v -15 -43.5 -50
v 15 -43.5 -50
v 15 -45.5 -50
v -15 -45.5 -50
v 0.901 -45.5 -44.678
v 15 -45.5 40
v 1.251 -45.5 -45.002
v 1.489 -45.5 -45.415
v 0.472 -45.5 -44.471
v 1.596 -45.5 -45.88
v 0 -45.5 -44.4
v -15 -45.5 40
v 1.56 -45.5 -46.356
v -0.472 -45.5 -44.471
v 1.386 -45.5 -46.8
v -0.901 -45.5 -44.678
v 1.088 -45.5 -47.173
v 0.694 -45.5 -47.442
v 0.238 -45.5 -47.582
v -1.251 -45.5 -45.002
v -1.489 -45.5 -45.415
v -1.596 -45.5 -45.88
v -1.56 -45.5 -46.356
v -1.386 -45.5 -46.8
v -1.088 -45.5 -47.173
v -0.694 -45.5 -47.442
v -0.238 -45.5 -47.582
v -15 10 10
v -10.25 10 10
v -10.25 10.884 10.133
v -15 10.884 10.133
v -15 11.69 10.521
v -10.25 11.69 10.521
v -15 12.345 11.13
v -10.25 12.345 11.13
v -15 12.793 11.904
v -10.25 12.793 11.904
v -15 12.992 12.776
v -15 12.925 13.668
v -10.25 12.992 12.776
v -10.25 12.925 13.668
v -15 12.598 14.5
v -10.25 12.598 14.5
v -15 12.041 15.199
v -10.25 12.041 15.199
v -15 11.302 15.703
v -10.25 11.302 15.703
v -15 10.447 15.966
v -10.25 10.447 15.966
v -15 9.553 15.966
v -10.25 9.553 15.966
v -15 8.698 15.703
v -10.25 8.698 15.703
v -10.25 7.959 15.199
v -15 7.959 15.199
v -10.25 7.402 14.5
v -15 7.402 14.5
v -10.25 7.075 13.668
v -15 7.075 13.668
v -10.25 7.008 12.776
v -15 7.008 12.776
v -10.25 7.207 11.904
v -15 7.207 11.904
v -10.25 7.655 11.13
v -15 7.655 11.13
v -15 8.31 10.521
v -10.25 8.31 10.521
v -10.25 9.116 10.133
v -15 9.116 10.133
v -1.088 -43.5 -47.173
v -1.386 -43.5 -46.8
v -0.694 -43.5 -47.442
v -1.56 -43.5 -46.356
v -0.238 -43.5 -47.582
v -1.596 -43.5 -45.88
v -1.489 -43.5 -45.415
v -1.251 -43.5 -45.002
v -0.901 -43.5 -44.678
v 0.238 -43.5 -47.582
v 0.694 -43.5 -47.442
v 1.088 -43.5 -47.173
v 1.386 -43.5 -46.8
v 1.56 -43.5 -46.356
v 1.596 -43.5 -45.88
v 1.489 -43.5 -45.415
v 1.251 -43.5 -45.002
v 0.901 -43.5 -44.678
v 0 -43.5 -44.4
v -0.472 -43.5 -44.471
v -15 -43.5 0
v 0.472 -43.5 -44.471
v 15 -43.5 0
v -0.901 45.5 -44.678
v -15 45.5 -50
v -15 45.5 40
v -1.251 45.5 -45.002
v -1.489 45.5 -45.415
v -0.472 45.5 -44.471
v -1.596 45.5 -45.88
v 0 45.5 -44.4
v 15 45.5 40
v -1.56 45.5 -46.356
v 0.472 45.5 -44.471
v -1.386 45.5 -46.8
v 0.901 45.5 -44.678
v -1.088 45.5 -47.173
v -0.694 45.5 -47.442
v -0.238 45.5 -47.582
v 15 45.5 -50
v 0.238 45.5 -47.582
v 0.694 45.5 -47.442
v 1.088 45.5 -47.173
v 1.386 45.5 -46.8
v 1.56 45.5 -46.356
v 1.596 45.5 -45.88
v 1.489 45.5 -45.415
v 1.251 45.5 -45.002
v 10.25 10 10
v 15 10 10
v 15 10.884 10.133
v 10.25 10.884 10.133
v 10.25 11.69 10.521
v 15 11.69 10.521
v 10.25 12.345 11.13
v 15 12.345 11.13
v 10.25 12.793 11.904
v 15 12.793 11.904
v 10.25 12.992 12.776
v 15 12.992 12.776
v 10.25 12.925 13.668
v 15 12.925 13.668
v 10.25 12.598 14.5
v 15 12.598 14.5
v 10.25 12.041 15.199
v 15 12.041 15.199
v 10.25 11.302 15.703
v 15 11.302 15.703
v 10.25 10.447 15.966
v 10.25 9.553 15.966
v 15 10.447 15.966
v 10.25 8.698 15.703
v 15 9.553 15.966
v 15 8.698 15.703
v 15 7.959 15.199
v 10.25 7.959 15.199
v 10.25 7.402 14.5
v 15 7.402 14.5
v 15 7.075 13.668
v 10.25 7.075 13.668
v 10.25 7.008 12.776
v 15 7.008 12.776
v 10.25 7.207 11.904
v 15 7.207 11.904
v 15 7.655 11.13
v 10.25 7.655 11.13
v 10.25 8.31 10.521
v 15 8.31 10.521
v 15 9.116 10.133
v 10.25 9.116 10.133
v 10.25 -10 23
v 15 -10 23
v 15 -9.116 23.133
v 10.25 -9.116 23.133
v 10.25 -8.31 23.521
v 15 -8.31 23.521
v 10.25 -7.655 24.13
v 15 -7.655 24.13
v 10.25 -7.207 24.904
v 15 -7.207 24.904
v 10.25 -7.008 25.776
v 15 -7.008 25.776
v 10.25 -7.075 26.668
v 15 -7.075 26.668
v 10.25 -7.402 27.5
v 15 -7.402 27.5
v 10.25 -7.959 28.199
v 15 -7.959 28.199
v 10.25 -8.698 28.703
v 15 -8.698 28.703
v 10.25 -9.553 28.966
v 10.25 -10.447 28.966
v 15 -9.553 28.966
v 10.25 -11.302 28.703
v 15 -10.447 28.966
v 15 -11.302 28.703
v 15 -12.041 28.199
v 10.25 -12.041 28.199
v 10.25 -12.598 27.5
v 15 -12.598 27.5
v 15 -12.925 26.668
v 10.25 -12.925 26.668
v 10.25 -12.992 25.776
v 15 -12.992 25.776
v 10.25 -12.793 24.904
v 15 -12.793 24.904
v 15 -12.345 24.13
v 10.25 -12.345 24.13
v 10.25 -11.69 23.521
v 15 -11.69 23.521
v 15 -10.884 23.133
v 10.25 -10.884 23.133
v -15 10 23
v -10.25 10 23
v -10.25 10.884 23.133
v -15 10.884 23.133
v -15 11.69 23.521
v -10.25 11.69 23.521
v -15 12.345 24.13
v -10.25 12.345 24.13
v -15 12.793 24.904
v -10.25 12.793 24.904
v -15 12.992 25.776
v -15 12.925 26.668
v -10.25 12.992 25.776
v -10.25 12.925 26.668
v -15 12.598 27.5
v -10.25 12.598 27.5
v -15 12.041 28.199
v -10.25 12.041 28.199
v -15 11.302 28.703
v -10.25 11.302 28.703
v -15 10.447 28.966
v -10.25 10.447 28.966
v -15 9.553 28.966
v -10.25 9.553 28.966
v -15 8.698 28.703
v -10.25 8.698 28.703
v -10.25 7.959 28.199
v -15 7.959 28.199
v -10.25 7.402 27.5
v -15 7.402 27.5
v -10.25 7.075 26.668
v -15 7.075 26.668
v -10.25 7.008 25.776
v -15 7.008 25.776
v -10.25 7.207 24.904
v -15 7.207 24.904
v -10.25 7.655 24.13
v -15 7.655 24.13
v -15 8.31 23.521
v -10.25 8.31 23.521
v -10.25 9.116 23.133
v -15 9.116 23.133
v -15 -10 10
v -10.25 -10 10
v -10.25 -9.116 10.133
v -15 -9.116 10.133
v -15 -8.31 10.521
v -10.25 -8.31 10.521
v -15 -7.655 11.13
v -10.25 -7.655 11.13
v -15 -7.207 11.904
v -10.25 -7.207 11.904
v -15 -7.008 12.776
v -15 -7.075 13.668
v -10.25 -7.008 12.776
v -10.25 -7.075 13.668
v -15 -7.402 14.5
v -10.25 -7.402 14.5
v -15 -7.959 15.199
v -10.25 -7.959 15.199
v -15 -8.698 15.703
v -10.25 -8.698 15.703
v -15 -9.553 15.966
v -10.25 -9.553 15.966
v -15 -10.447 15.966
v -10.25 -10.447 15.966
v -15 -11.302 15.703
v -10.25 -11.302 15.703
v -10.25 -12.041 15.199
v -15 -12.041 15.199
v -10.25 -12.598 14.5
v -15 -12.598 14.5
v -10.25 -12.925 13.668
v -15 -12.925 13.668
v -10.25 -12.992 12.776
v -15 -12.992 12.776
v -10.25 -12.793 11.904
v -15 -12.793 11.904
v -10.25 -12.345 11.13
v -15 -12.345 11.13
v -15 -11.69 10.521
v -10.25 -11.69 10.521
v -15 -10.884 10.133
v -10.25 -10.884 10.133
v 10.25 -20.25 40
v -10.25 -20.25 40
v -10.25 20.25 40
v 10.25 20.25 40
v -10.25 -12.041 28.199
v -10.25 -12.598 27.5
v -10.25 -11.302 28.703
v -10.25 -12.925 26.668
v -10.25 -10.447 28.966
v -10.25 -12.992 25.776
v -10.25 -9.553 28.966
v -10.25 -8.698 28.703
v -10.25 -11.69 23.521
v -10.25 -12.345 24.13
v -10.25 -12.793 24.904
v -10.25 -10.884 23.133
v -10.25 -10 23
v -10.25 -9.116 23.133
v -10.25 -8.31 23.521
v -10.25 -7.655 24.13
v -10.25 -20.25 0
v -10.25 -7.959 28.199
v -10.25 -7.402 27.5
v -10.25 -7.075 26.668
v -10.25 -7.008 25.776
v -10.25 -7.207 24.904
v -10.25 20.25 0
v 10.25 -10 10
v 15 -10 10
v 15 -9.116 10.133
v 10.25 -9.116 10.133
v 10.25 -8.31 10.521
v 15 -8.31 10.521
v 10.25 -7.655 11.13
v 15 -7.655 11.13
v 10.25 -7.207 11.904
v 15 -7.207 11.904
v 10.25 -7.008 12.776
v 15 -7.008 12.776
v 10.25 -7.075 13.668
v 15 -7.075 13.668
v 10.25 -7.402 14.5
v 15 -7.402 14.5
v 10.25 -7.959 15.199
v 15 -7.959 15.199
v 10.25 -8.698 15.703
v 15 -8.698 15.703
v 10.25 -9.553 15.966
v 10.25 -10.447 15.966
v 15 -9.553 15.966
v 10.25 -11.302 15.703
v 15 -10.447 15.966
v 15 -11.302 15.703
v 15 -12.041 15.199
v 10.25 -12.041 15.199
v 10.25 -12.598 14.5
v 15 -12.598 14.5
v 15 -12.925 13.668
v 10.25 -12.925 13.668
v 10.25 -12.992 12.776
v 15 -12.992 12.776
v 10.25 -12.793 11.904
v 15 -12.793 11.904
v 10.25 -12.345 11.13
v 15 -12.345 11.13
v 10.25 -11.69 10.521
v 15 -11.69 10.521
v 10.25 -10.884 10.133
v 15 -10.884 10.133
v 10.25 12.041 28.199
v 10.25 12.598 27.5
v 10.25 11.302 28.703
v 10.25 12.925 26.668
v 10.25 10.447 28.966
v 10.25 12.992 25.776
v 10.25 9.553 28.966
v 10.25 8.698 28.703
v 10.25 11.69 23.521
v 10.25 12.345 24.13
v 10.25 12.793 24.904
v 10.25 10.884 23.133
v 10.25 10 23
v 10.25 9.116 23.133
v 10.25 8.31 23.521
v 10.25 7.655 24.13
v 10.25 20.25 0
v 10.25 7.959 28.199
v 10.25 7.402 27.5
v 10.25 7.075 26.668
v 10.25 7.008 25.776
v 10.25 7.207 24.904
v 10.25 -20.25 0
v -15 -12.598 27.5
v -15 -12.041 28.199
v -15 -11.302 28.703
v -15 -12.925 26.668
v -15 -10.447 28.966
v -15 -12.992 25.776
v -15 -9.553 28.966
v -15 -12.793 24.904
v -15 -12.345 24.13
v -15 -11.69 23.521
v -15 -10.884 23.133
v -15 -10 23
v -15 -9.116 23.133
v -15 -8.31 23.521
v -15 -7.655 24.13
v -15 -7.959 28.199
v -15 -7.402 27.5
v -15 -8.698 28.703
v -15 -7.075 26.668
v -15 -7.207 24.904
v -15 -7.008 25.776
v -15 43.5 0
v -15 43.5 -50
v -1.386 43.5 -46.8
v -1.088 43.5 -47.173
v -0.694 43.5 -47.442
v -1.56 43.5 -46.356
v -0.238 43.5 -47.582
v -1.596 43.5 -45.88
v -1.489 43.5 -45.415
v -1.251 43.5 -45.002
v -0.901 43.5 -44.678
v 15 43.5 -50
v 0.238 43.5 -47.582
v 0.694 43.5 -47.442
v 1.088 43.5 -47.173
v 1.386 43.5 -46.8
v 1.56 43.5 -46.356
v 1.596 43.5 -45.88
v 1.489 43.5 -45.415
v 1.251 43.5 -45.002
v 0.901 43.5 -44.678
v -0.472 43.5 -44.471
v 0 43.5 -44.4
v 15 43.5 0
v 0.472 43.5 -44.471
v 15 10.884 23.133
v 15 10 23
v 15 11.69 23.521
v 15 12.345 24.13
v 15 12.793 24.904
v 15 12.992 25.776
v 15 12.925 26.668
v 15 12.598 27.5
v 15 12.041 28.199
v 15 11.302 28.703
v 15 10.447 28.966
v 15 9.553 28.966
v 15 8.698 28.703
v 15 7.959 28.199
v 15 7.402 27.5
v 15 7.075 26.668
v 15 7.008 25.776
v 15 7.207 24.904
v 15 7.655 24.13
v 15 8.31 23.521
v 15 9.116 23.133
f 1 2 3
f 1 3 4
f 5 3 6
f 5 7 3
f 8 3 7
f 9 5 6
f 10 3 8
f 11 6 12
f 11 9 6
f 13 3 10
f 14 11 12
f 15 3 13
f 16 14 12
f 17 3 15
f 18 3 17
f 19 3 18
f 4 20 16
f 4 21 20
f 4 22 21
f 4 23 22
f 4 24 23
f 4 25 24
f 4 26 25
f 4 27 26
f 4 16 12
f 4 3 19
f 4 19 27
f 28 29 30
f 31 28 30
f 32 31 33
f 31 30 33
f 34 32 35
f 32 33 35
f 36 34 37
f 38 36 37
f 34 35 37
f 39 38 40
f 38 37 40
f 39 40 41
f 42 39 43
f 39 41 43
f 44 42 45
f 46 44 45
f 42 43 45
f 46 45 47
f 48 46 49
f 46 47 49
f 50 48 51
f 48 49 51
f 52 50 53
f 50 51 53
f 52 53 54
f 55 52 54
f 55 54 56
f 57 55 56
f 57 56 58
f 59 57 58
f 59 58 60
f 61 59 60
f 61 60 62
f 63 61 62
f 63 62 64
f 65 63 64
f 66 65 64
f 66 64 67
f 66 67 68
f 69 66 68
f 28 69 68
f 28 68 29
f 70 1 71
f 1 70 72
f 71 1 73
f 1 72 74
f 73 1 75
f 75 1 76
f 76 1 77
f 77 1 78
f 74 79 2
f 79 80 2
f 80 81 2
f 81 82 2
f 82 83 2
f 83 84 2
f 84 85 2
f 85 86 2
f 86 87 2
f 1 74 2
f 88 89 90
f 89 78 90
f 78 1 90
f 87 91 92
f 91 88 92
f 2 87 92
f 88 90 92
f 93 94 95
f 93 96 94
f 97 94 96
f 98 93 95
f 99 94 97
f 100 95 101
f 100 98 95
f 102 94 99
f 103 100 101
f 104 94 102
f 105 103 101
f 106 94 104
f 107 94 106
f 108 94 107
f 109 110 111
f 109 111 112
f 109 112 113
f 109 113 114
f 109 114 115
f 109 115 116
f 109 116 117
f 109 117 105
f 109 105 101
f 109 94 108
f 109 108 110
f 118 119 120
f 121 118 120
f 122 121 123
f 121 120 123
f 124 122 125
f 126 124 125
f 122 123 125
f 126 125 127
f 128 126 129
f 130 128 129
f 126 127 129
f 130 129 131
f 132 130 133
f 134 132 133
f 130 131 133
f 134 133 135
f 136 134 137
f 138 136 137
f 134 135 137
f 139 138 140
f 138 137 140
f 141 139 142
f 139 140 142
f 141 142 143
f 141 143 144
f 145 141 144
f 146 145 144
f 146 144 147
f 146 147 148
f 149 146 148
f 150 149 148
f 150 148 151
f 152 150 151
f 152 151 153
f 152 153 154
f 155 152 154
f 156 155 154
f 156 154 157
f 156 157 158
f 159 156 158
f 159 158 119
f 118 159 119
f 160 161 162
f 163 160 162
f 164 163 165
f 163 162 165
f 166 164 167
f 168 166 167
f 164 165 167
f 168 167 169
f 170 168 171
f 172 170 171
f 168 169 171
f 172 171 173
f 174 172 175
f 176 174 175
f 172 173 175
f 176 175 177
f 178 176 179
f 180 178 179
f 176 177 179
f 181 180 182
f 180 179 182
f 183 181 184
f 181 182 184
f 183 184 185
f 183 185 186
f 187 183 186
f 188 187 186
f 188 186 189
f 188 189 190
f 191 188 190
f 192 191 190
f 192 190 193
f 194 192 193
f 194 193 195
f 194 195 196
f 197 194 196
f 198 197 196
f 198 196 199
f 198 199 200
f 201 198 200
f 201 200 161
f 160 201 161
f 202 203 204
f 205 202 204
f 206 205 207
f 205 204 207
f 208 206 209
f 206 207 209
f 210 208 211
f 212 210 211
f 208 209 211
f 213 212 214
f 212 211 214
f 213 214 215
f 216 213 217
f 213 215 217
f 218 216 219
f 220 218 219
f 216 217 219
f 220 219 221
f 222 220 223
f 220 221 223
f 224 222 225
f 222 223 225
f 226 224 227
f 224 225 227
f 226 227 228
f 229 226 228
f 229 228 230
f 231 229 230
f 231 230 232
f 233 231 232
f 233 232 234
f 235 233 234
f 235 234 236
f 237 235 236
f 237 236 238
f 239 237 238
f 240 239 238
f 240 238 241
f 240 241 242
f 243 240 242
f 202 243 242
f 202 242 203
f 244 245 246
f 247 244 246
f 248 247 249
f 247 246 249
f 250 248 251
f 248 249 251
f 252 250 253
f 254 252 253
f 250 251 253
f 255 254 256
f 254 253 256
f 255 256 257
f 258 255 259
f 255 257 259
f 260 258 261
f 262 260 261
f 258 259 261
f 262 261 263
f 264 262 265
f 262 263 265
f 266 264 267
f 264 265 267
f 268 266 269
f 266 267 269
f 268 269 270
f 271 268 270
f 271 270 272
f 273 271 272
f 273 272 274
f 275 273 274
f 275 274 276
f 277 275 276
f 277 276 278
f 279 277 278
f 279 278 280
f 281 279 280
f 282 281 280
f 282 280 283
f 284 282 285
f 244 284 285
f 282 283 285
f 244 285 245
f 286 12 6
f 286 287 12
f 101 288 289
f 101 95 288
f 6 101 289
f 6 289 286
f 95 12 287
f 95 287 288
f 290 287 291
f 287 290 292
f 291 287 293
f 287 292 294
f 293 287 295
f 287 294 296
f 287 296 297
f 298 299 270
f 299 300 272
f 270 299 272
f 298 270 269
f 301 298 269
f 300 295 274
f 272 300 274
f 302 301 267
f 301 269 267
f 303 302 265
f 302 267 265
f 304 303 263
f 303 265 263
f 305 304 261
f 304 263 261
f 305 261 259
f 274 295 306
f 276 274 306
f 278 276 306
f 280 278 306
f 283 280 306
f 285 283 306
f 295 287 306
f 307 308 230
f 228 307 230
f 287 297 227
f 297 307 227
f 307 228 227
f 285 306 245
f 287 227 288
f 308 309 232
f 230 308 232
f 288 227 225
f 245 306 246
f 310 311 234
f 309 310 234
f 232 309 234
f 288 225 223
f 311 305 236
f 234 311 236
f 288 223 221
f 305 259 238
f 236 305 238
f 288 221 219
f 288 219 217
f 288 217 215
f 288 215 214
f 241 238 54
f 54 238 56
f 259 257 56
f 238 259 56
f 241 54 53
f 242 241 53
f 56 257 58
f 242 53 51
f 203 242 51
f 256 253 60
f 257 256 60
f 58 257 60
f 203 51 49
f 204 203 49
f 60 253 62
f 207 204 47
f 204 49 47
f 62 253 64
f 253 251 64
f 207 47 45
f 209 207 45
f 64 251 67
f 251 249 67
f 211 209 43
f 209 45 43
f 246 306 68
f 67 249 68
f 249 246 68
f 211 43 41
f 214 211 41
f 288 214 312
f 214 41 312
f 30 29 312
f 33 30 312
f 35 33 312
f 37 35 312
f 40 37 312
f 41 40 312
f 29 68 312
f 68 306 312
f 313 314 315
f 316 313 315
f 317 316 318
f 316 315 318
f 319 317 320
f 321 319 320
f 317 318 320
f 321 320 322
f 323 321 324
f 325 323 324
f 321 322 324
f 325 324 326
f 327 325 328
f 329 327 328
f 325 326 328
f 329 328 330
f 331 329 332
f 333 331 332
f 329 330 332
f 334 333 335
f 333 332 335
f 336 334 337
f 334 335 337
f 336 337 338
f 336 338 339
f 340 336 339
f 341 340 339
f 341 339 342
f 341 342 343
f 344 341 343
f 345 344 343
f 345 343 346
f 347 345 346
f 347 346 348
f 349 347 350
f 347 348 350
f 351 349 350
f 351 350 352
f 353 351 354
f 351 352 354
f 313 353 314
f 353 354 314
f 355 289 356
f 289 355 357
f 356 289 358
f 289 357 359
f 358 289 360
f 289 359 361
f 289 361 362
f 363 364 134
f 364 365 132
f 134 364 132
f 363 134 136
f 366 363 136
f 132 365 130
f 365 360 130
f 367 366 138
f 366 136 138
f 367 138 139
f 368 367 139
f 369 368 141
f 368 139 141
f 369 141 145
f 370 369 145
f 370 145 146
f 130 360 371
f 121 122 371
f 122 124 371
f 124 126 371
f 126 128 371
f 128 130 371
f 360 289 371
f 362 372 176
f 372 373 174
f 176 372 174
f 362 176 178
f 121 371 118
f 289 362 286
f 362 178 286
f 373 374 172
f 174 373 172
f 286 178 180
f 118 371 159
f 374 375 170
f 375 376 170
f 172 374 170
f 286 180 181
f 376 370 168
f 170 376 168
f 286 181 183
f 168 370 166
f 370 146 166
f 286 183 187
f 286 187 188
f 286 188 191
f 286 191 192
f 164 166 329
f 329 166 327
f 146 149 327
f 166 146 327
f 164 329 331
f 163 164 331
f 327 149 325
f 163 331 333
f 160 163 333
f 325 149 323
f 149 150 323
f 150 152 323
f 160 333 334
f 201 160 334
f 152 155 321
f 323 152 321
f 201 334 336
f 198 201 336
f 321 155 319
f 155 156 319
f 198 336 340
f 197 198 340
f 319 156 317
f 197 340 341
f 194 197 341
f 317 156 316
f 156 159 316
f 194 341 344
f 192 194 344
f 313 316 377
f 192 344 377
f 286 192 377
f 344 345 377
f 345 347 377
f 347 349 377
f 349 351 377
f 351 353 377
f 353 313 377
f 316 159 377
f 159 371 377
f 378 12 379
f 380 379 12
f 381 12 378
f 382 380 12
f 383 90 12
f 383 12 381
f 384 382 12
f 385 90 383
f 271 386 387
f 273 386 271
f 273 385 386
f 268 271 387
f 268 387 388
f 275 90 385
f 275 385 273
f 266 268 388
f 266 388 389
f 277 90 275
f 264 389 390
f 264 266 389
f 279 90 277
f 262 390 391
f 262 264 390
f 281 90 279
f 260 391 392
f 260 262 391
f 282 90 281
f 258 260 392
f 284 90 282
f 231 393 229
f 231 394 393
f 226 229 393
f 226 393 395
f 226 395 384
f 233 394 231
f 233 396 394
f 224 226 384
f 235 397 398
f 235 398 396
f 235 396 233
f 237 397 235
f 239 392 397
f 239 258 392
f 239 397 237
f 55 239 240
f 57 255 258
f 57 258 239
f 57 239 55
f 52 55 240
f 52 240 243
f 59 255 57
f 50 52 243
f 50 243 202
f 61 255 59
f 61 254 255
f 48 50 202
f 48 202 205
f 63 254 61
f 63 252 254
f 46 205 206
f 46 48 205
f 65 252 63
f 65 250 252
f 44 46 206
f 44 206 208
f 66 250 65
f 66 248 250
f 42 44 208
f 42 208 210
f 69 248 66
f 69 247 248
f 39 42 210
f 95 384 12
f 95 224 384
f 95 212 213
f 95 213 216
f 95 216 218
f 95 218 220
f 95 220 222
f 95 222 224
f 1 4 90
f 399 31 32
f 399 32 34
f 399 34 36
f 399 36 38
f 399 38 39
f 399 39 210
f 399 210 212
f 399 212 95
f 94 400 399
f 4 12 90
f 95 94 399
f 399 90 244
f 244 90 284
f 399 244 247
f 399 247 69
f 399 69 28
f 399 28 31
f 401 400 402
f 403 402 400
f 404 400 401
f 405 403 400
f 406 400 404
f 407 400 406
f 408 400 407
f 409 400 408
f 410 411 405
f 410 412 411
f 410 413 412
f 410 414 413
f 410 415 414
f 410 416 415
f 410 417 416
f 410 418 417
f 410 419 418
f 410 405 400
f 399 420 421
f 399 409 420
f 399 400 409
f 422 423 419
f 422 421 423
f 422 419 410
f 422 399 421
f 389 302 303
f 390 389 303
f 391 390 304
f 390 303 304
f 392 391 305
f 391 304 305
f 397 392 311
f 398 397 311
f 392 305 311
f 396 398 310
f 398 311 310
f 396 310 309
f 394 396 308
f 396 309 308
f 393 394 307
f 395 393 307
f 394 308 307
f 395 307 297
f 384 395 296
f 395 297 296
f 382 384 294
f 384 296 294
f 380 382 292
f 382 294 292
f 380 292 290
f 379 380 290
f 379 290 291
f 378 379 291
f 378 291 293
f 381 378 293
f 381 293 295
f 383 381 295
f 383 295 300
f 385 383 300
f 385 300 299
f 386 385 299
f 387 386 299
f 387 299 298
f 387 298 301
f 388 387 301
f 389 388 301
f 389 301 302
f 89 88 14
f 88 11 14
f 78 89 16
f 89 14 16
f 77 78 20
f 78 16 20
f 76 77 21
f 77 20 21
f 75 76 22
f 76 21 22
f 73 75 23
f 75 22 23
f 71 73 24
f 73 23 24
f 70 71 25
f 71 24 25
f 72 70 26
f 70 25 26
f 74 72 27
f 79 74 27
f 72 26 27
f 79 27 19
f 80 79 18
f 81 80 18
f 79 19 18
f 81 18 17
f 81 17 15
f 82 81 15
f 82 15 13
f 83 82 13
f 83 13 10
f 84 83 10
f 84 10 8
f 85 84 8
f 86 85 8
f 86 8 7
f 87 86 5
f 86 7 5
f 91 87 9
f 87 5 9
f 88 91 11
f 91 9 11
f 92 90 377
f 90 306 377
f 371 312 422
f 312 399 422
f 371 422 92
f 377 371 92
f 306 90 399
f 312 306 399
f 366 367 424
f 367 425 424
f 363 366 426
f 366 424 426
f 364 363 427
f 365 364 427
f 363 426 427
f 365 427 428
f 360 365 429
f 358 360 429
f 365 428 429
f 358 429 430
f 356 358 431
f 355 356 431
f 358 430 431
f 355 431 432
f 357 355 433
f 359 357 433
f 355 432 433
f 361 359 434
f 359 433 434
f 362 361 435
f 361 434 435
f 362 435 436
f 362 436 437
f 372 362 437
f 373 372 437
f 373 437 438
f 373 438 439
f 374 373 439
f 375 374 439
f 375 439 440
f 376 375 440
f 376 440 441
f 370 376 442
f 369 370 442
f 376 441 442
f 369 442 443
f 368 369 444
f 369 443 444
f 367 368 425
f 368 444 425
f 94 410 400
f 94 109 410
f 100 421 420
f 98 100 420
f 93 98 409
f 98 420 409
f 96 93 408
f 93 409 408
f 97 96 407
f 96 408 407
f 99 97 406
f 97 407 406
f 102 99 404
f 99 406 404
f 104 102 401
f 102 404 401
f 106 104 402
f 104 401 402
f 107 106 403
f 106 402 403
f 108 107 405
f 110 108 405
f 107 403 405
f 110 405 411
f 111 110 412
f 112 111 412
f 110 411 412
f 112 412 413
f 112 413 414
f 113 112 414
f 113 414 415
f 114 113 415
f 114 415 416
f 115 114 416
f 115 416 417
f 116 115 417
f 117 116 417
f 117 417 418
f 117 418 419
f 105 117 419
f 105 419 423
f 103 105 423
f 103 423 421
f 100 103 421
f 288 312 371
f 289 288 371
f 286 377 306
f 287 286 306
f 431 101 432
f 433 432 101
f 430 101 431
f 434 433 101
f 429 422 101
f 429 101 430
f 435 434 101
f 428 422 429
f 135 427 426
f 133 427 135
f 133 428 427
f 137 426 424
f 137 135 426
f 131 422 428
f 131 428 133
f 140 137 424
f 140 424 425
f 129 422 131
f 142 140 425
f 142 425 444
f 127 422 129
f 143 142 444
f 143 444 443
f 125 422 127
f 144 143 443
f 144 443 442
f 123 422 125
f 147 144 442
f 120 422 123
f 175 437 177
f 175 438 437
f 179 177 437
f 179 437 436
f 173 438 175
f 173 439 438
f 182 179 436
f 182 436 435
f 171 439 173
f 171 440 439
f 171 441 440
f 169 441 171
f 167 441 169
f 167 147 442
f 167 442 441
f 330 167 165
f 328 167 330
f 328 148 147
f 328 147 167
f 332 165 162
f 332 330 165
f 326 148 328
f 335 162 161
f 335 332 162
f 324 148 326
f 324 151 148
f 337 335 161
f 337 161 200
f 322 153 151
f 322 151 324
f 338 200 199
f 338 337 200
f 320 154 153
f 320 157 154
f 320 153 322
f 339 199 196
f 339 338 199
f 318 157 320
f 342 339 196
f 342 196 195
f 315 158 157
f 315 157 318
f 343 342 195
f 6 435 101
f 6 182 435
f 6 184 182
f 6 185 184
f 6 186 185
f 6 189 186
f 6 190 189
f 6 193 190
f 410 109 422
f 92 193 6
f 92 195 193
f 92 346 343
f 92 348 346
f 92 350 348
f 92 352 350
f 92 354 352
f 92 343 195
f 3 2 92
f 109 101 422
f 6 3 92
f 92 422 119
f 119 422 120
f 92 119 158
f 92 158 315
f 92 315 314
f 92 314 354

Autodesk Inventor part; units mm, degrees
ref_plane "YZ Plane" through (0, 0, 0) normal (1, 0, 0) x (0, 1, 0)
ref_plane "XZ Plane" through (0, 0, 0) normal (0, 1, 0) x (-1, 0, 0)
ref_plane "XY Plane" through (0, 0, 0) normal (0, 0, 1) x (1, 0, 0)
sketch "スケッチ1" plane through (0, 0, 0) normal (0, 0, 1) x (1, 0, 0)
  line L0 (15, -45.5) -> (-15, -45.5)
  line L1 (-15, -45.5) -> (-15, 45.5)
  line L2 (-15, 45.5) -> (15, 45.5)
  line L3 (15, 45.5) -> (15, -45.5)
  line L4 (15, -45.5) -> (-15, 45.5) construction
  line L5 (-15, -45.5) -> (15, 45.5) construction
  line L6 (-10.25, -20.25) -> (-10.25, 20.25)
  line L7 (-10.25, 20.25) -> (10.25, 20.25)
  line L8 (10.25, 20.25) -> (10.25, -20.25)
  line L9 (10.25, -20.25) -> (-10.25, -20.25)
  line L10 (-10.25, -20.25) -> (10.25, 20.25) construction
  line L11 (-10.25, 20.25) -> (10.25, -20.25) construction
  point P0 (0, 0)
  dimension "d0" = 30
  dimension "d1" = 91
  dimension "d4" = 40.5
  dimension "d5" = 20.5
extrude "押し出し1" add sketch "スケッチ1" along normal blind 40
sketch "スケッチ2" plane through (0, 0, 0) normal (0, 0, -1) x (-1, 0, 0)
  line L0 (-15, -45.5) -> (-15, 45.5) projected
  line L1 (15, 45.5) -> (15, -45.5) projected
  line L2 (-15, -45.5) -> (15, -45.5)
  line L3 (15, -45.5) -> (15, -43.5)
  line L4 (15, -43.5) -> (-15, -43.5)
  line L5 (-15, -43.5) -> (-15, -45.5)
  line L6 (-15, 45.5) -> (15, 45.5) projected
  line L7 (-15, 45.5) -> (15, 45.5)
  line L8 (15, 45.5) -> (15, 43.5)
  line L9 (15, 43.5) -> (-15, 43.5)
  line L10 (-15, 43.5) -> (-15, 45.5)
  point P0 (0, 0)
  point P1 (-15, 43.5)
  dimension "d6" = 2
  dimension "d7" = 2
extrude "押し出し2" add sketch "スケッチ2" along normal blind 50 contours L0 L4 L1 L2 | L0 L6 L1 L9
sketch "スケッチ3" plane through (-15, 45.5, 40) normal (0, 1, 0) x (1, 0, 0)
  line L0 (0, 90) -> (30, 90) projected
  line L1 (30, 0) -> (30, 90) projected
  point P0 (15, 40)
  point P1 (15, 86)
  dimension "d10" = 4
  dimension "d11" = 15
hole "穴1" at (0, 45.5, -46) direction (0, -1, 0) diameter 3.2 depth 91
sketch "スケッチ4" plane through (15, -45.5, 40) normal (1, 0, 0) x (0, 0, -1)
  circle A0 centre (27, 55.5) radius 3
  line L0 (0, 0) -> (0, 91) projected
  line L1 (40, 2) -> (40, 89) projected
  line L2 (0, 91) -> (90, 91) projected
  circle A1 centre (14, 55.5) radius 3
  circle A2 centre (27, 35.5) radius 3
  circle A3 centre (14, 35.5) radius 3
  point P0 (40, 45.5)
  point P1 (0, 45.5)
  dimension "d19" = 10
  dimension "d20" = 13
  dimension "d23" = 13
  dimension "d26" = 20
  dimension "d29" = 6
extrude "押し出し3" cut sketch "スケッチ4" against normal up to surface (30 mm away)
properties part number "frame_arm"
